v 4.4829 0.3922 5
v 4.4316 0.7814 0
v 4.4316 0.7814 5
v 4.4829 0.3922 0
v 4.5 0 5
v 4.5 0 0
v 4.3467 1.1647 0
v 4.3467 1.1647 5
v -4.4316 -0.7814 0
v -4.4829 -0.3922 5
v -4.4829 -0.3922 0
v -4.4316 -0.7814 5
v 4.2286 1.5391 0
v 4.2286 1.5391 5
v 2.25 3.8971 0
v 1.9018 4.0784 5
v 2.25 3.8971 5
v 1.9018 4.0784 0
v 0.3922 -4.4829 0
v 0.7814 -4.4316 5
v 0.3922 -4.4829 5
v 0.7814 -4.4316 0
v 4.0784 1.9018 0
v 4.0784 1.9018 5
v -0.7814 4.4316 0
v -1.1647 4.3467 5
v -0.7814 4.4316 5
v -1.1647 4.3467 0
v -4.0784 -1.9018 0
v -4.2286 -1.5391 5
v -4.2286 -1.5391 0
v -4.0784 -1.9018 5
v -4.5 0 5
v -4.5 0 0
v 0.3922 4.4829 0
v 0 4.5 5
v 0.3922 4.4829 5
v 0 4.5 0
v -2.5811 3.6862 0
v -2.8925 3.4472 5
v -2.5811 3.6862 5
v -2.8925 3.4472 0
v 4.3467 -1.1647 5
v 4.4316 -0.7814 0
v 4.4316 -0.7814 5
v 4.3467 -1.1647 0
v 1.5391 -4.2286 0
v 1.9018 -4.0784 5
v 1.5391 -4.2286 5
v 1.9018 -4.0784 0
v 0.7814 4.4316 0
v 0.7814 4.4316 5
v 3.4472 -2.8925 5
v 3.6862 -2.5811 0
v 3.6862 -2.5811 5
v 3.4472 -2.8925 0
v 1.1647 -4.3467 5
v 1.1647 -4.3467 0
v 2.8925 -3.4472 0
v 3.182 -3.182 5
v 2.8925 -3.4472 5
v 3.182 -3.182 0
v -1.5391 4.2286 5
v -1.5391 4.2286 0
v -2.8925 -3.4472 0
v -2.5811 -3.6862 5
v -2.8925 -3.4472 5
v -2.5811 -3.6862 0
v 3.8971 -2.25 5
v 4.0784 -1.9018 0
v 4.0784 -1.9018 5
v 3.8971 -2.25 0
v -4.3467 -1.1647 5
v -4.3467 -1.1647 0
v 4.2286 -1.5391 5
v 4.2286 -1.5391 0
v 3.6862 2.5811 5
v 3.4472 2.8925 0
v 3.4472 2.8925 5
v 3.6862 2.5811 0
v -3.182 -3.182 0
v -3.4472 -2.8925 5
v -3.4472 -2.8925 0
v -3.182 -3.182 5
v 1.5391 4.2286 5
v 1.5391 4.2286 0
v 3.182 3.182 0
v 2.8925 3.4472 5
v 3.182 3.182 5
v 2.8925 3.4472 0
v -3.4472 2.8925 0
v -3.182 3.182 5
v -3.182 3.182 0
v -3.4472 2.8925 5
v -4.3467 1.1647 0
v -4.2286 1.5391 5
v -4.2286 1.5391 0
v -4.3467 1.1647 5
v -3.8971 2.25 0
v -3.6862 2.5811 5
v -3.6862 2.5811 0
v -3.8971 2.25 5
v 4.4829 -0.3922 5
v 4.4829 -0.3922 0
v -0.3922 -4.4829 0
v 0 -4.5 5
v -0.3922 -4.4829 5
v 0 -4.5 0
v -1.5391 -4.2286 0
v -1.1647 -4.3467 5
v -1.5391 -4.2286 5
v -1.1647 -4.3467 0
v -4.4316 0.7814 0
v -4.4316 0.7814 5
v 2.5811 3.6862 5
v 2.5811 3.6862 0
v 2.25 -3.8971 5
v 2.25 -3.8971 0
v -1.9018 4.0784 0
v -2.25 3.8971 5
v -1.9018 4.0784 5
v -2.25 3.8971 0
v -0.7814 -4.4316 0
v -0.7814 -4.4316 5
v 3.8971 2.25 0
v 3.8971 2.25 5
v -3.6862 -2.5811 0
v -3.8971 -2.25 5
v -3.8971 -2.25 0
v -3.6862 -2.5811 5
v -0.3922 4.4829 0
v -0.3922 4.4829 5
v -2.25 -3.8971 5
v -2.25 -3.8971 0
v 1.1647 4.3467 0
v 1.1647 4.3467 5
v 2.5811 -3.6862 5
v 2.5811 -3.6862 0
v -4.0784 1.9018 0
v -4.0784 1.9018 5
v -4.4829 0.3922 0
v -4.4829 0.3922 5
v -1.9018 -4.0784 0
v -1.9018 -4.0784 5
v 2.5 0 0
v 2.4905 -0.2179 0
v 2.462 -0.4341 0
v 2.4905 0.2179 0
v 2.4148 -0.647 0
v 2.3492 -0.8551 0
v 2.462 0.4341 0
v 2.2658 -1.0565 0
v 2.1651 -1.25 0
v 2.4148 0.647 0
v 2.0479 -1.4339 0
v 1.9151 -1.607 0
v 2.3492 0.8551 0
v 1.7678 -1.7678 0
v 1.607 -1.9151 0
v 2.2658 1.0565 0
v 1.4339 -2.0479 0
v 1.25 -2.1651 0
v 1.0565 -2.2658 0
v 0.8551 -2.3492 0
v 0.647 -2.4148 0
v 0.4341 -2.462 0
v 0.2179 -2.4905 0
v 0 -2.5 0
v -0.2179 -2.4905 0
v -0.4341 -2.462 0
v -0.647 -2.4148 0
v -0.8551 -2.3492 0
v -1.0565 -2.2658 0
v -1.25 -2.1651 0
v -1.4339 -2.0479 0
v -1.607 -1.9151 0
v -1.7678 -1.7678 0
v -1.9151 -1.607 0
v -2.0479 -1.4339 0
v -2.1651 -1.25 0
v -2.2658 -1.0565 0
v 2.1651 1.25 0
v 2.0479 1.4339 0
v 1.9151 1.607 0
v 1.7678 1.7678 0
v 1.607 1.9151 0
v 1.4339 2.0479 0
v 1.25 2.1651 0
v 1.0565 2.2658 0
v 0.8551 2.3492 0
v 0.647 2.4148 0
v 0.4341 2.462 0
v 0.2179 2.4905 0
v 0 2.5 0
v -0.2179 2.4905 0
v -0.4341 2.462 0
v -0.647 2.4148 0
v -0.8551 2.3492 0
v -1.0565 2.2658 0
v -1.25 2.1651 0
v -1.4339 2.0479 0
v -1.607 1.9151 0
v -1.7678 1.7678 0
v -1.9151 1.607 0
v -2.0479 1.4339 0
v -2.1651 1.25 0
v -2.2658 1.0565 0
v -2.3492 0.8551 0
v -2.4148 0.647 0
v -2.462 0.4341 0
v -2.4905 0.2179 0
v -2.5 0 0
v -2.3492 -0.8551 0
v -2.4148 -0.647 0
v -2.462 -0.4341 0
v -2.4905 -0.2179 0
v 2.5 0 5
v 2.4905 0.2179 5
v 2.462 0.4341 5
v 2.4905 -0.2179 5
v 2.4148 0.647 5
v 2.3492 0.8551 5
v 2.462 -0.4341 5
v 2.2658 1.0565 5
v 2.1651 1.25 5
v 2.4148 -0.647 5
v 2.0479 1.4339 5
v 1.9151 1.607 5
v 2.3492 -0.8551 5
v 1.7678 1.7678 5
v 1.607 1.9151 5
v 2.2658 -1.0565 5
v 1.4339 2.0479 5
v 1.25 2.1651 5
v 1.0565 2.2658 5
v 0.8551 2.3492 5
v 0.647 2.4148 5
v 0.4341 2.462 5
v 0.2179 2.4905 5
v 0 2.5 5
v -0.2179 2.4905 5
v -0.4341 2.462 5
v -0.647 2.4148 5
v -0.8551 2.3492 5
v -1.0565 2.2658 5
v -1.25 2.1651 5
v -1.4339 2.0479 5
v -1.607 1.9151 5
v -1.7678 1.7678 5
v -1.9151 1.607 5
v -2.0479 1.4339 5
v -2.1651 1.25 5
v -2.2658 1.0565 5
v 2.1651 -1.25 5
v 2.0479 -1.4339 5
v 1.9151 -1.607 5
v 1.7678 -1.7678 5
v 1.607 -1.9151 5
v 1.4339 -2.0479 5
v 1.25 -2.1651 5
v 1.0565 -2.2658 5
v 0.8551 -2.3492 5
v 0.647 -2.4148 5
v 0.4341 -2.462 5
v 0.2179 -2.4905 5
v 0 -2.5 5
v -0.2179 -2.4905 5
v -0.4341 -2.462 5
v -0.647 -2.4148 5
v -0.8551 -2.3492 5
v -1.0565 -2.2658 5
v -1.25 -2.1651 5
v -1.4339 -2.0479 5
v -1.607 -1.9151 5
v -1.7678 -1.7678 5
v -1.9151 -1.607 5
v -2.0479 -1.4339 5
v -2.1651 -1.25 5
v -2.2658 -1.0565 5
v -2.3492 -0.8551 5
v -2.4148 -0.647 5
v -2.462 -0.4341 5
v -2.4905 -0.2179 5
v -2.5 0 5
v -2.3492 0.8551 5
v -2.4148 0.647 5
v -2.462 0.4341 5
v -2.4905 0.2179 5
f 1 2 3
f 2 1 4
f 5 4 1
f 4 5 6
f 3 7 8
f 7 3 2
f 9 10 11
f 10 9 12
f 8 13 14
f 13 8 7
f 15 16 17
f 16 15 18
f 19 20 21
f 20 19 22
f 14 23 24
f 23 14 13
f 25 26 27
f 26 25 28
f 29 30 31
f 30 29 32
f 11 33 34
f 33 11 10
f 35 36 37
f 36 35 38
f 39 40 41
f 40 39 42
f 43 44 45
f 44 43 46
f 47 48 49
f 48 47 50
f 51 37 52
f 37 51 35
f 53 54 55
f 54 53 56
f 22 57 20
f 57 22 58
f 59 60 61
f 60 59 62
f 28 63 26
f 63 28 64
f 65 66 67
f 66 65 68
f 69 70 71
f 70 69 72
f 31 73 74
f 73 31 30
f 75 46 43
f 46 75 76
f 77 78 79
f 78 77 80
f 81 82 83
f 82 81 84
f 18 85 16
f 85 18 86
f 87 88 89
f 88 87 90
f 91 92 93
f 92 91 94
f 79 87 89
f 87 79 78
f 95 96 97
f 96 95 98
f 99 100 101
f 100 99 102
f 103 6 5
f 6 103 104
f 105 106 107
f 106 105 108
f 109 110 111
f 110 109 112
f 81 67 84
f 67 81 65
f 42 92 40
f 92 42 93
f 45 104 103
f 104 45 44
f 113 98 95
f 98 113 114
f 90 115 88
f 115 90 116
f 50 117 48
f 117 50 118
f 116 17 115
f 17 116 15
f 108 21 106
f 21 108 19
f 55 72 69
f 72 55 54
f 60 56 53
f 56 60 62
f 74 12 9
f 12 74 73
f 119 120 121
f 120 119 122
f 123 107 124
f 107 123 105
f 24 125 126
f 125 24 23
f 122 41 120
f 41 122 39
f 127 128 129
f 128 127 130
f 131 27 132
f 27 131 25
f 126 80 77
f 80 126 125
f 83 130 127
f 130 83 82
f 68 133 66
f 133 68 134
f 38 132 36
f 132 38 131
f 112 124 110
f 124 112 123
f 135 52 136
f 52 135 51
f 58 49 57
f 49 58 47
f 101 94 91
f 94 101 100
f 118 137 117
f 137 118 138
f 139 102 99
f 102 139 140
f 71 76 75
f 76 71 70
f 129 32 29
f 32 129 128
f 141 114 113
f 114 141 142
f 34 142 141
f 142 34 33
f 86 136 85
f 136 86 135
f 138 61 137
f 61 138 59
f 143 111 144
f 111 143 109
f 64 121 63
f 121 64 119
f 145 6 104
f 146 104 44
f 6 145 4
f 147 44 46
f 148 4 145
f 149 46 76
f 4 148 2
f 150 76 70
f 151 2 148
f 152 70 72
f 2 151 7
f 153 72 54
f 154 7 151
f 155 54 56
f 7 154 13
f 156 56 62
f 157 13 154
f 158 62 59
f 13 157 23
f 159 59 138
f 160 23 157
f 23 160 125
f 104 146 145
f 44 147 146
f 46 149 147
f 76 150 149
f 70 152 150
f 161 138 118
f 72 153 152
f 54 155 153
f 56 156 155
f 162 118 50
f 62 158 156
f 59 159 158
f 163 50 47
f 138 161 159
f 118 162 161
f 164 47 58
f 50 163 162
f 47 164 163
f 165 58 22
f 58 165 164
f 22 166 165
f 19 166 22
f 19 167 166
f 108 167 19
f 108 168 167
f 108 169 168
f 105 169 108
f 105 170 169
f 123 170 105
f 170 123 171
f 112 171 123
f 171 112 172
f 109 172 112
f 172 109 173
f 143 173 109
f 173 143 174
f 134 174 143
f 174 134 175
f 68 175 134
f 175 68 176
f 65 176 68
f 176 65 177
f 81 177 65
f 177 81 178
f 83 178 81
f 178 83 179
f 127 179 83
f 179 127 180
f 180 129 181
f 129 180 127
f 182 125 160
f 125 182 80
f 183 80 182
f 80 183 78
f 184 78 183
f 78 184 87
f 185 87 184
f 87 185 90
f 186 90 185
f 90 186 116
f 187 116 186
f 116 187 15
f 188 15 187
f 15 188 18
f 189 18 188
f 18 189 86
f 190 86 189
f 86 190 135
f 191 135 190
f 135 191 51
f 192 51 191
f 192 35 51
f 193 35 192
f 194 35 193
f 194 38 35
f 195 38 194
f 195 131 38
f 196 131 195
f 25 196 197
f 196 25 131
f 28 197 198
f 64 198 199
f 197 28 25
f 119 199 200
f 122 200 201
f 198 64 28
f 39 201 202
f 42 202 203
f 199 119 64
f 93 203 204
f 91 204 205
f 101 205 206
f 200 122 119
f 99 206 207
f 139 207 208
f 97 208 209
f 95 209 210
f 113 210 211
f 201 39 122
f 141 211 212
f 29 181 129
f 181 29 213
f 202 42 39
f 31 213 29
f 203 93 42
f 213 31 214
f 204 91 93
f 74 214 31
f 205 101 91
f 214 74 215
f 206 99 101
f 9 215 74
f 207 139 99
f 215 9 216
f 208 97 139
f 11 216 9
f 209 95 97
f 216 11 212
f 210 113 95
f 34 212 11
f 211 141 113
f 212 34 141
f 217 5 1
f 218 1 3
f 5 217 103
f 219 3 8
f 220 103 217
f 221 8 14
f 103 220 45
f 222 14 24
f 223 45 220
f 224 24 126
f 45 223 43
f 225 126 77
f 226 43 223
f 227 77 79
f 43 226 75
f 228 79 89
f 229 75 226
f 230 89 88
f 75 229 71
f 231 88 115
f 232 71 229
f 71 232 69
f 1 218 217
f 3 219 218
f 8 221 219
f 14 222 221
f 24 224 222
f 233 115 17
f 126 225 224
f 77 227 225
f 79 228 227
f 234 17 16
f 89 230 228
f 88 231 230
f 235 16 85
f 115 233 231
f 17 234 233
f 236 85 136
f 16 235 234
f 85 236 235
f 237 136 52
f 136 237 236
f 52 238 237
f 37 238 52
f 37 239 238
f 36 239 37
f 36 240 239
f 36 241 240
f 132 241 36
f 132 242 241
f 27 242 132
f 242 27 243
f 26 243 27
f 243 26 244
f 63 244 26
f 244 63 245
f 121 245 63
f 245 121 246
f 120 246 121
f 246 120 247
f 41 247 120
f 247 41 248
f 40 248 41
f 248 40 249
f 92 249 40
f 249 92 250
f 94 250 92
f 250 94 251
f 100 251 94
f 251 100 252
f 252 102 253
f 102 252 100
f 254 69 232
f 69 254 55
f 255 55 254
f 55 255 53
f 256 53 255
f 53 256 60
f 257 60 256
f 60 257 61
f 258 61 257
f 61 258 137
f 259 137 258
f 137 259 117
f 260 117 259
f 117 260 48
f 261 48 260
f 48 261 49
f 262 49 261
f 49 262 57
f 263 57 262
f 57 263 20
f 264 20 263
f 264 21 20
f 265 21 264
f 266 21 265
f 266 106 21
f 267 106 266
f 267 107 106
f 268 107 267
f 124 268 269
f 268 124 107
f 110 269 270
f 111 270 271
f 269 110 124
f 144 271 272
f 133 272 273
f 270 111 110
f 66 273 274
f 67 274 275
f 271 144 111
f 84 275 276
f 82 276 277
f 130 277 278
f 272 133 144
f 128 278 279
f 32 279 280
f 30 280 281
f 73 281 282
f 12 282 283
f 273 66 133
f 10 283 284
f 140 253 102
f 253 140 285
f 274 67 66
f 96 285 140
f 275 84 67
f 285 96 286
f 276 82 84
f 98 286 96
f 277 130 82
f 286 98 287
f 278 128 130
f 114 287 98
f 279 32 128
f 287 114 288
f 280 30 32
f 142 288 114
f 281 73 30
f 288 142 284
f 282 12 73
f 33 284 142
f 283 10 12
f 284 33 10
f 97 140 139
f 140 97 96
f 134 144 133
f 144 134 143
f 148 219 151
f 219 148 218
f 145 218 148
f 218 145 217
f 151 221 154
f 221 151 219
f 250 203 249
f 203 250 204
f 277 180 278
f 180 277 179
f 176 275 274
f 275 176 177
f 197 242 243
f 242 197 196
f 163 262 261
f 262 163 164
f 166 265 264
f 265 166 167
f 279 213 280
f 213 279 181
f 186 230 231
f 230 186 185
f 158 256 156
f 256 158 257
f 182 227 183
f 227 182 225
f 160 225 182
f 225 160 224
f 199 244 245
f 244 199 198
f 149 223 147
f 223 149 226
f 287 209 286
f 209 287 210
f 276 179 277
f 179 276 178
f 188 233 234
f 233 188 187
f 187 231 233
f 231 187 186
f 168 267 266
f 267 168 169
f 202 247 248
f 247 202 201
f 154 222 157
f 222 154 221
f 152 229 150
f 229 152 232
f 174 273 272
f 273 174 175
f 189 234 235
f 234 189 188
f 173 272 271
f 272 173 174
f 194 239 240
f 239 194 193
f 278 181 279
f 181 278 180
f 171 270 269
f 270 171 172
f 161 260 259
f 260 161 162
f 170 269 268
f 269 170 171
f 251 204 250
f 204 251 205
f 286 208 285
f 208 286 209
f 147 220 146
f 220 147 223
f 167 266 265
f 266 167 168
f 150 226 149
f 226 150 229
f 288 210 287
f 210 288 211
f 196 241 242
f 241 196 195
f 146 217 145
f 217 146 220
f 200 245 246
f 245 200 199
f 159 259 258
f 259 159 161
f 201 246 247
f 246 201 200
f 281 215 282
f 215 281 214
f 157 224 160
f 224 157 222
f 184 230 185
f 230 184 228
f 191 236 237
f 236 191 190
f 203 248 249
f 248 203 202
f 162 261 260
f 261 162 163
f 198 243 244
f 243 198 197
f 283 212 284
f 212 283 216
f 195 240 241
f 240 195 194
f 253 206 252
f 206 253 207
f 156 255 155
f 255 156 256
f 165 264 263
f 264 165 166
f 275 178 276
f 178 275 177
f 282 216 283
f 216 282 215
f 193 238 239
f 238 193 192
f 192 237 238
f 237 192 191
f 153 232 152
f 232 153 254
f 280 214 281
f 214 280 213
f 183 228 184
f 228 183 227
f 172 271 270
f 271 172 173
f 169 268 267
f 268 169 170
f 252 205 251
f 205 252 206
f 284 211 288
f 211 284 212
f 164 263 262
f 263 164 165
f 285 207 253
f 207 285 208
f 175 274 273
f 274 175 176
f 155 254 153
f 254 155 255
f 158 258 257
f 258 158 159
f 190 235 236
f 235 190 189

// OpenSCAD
// Simple Customizable Washer
// by Mark Thompson

washer_outside_diameter = 9;
washer_hole_diameter = 5;
washer_thickness = 5;

$fn = 72;

difference() {
    translate([0,0,washer_thickness/2])
        cylinder(washer_thickness,washer_outside_diameter/2,washer_outside_diameter/2,true);
    
    translate([0,0,washer_thickness/2])
        cylinder(washer_thickness+0.1,washer_hole_diameter/2,washer_hole_diameter/2,true);
}
